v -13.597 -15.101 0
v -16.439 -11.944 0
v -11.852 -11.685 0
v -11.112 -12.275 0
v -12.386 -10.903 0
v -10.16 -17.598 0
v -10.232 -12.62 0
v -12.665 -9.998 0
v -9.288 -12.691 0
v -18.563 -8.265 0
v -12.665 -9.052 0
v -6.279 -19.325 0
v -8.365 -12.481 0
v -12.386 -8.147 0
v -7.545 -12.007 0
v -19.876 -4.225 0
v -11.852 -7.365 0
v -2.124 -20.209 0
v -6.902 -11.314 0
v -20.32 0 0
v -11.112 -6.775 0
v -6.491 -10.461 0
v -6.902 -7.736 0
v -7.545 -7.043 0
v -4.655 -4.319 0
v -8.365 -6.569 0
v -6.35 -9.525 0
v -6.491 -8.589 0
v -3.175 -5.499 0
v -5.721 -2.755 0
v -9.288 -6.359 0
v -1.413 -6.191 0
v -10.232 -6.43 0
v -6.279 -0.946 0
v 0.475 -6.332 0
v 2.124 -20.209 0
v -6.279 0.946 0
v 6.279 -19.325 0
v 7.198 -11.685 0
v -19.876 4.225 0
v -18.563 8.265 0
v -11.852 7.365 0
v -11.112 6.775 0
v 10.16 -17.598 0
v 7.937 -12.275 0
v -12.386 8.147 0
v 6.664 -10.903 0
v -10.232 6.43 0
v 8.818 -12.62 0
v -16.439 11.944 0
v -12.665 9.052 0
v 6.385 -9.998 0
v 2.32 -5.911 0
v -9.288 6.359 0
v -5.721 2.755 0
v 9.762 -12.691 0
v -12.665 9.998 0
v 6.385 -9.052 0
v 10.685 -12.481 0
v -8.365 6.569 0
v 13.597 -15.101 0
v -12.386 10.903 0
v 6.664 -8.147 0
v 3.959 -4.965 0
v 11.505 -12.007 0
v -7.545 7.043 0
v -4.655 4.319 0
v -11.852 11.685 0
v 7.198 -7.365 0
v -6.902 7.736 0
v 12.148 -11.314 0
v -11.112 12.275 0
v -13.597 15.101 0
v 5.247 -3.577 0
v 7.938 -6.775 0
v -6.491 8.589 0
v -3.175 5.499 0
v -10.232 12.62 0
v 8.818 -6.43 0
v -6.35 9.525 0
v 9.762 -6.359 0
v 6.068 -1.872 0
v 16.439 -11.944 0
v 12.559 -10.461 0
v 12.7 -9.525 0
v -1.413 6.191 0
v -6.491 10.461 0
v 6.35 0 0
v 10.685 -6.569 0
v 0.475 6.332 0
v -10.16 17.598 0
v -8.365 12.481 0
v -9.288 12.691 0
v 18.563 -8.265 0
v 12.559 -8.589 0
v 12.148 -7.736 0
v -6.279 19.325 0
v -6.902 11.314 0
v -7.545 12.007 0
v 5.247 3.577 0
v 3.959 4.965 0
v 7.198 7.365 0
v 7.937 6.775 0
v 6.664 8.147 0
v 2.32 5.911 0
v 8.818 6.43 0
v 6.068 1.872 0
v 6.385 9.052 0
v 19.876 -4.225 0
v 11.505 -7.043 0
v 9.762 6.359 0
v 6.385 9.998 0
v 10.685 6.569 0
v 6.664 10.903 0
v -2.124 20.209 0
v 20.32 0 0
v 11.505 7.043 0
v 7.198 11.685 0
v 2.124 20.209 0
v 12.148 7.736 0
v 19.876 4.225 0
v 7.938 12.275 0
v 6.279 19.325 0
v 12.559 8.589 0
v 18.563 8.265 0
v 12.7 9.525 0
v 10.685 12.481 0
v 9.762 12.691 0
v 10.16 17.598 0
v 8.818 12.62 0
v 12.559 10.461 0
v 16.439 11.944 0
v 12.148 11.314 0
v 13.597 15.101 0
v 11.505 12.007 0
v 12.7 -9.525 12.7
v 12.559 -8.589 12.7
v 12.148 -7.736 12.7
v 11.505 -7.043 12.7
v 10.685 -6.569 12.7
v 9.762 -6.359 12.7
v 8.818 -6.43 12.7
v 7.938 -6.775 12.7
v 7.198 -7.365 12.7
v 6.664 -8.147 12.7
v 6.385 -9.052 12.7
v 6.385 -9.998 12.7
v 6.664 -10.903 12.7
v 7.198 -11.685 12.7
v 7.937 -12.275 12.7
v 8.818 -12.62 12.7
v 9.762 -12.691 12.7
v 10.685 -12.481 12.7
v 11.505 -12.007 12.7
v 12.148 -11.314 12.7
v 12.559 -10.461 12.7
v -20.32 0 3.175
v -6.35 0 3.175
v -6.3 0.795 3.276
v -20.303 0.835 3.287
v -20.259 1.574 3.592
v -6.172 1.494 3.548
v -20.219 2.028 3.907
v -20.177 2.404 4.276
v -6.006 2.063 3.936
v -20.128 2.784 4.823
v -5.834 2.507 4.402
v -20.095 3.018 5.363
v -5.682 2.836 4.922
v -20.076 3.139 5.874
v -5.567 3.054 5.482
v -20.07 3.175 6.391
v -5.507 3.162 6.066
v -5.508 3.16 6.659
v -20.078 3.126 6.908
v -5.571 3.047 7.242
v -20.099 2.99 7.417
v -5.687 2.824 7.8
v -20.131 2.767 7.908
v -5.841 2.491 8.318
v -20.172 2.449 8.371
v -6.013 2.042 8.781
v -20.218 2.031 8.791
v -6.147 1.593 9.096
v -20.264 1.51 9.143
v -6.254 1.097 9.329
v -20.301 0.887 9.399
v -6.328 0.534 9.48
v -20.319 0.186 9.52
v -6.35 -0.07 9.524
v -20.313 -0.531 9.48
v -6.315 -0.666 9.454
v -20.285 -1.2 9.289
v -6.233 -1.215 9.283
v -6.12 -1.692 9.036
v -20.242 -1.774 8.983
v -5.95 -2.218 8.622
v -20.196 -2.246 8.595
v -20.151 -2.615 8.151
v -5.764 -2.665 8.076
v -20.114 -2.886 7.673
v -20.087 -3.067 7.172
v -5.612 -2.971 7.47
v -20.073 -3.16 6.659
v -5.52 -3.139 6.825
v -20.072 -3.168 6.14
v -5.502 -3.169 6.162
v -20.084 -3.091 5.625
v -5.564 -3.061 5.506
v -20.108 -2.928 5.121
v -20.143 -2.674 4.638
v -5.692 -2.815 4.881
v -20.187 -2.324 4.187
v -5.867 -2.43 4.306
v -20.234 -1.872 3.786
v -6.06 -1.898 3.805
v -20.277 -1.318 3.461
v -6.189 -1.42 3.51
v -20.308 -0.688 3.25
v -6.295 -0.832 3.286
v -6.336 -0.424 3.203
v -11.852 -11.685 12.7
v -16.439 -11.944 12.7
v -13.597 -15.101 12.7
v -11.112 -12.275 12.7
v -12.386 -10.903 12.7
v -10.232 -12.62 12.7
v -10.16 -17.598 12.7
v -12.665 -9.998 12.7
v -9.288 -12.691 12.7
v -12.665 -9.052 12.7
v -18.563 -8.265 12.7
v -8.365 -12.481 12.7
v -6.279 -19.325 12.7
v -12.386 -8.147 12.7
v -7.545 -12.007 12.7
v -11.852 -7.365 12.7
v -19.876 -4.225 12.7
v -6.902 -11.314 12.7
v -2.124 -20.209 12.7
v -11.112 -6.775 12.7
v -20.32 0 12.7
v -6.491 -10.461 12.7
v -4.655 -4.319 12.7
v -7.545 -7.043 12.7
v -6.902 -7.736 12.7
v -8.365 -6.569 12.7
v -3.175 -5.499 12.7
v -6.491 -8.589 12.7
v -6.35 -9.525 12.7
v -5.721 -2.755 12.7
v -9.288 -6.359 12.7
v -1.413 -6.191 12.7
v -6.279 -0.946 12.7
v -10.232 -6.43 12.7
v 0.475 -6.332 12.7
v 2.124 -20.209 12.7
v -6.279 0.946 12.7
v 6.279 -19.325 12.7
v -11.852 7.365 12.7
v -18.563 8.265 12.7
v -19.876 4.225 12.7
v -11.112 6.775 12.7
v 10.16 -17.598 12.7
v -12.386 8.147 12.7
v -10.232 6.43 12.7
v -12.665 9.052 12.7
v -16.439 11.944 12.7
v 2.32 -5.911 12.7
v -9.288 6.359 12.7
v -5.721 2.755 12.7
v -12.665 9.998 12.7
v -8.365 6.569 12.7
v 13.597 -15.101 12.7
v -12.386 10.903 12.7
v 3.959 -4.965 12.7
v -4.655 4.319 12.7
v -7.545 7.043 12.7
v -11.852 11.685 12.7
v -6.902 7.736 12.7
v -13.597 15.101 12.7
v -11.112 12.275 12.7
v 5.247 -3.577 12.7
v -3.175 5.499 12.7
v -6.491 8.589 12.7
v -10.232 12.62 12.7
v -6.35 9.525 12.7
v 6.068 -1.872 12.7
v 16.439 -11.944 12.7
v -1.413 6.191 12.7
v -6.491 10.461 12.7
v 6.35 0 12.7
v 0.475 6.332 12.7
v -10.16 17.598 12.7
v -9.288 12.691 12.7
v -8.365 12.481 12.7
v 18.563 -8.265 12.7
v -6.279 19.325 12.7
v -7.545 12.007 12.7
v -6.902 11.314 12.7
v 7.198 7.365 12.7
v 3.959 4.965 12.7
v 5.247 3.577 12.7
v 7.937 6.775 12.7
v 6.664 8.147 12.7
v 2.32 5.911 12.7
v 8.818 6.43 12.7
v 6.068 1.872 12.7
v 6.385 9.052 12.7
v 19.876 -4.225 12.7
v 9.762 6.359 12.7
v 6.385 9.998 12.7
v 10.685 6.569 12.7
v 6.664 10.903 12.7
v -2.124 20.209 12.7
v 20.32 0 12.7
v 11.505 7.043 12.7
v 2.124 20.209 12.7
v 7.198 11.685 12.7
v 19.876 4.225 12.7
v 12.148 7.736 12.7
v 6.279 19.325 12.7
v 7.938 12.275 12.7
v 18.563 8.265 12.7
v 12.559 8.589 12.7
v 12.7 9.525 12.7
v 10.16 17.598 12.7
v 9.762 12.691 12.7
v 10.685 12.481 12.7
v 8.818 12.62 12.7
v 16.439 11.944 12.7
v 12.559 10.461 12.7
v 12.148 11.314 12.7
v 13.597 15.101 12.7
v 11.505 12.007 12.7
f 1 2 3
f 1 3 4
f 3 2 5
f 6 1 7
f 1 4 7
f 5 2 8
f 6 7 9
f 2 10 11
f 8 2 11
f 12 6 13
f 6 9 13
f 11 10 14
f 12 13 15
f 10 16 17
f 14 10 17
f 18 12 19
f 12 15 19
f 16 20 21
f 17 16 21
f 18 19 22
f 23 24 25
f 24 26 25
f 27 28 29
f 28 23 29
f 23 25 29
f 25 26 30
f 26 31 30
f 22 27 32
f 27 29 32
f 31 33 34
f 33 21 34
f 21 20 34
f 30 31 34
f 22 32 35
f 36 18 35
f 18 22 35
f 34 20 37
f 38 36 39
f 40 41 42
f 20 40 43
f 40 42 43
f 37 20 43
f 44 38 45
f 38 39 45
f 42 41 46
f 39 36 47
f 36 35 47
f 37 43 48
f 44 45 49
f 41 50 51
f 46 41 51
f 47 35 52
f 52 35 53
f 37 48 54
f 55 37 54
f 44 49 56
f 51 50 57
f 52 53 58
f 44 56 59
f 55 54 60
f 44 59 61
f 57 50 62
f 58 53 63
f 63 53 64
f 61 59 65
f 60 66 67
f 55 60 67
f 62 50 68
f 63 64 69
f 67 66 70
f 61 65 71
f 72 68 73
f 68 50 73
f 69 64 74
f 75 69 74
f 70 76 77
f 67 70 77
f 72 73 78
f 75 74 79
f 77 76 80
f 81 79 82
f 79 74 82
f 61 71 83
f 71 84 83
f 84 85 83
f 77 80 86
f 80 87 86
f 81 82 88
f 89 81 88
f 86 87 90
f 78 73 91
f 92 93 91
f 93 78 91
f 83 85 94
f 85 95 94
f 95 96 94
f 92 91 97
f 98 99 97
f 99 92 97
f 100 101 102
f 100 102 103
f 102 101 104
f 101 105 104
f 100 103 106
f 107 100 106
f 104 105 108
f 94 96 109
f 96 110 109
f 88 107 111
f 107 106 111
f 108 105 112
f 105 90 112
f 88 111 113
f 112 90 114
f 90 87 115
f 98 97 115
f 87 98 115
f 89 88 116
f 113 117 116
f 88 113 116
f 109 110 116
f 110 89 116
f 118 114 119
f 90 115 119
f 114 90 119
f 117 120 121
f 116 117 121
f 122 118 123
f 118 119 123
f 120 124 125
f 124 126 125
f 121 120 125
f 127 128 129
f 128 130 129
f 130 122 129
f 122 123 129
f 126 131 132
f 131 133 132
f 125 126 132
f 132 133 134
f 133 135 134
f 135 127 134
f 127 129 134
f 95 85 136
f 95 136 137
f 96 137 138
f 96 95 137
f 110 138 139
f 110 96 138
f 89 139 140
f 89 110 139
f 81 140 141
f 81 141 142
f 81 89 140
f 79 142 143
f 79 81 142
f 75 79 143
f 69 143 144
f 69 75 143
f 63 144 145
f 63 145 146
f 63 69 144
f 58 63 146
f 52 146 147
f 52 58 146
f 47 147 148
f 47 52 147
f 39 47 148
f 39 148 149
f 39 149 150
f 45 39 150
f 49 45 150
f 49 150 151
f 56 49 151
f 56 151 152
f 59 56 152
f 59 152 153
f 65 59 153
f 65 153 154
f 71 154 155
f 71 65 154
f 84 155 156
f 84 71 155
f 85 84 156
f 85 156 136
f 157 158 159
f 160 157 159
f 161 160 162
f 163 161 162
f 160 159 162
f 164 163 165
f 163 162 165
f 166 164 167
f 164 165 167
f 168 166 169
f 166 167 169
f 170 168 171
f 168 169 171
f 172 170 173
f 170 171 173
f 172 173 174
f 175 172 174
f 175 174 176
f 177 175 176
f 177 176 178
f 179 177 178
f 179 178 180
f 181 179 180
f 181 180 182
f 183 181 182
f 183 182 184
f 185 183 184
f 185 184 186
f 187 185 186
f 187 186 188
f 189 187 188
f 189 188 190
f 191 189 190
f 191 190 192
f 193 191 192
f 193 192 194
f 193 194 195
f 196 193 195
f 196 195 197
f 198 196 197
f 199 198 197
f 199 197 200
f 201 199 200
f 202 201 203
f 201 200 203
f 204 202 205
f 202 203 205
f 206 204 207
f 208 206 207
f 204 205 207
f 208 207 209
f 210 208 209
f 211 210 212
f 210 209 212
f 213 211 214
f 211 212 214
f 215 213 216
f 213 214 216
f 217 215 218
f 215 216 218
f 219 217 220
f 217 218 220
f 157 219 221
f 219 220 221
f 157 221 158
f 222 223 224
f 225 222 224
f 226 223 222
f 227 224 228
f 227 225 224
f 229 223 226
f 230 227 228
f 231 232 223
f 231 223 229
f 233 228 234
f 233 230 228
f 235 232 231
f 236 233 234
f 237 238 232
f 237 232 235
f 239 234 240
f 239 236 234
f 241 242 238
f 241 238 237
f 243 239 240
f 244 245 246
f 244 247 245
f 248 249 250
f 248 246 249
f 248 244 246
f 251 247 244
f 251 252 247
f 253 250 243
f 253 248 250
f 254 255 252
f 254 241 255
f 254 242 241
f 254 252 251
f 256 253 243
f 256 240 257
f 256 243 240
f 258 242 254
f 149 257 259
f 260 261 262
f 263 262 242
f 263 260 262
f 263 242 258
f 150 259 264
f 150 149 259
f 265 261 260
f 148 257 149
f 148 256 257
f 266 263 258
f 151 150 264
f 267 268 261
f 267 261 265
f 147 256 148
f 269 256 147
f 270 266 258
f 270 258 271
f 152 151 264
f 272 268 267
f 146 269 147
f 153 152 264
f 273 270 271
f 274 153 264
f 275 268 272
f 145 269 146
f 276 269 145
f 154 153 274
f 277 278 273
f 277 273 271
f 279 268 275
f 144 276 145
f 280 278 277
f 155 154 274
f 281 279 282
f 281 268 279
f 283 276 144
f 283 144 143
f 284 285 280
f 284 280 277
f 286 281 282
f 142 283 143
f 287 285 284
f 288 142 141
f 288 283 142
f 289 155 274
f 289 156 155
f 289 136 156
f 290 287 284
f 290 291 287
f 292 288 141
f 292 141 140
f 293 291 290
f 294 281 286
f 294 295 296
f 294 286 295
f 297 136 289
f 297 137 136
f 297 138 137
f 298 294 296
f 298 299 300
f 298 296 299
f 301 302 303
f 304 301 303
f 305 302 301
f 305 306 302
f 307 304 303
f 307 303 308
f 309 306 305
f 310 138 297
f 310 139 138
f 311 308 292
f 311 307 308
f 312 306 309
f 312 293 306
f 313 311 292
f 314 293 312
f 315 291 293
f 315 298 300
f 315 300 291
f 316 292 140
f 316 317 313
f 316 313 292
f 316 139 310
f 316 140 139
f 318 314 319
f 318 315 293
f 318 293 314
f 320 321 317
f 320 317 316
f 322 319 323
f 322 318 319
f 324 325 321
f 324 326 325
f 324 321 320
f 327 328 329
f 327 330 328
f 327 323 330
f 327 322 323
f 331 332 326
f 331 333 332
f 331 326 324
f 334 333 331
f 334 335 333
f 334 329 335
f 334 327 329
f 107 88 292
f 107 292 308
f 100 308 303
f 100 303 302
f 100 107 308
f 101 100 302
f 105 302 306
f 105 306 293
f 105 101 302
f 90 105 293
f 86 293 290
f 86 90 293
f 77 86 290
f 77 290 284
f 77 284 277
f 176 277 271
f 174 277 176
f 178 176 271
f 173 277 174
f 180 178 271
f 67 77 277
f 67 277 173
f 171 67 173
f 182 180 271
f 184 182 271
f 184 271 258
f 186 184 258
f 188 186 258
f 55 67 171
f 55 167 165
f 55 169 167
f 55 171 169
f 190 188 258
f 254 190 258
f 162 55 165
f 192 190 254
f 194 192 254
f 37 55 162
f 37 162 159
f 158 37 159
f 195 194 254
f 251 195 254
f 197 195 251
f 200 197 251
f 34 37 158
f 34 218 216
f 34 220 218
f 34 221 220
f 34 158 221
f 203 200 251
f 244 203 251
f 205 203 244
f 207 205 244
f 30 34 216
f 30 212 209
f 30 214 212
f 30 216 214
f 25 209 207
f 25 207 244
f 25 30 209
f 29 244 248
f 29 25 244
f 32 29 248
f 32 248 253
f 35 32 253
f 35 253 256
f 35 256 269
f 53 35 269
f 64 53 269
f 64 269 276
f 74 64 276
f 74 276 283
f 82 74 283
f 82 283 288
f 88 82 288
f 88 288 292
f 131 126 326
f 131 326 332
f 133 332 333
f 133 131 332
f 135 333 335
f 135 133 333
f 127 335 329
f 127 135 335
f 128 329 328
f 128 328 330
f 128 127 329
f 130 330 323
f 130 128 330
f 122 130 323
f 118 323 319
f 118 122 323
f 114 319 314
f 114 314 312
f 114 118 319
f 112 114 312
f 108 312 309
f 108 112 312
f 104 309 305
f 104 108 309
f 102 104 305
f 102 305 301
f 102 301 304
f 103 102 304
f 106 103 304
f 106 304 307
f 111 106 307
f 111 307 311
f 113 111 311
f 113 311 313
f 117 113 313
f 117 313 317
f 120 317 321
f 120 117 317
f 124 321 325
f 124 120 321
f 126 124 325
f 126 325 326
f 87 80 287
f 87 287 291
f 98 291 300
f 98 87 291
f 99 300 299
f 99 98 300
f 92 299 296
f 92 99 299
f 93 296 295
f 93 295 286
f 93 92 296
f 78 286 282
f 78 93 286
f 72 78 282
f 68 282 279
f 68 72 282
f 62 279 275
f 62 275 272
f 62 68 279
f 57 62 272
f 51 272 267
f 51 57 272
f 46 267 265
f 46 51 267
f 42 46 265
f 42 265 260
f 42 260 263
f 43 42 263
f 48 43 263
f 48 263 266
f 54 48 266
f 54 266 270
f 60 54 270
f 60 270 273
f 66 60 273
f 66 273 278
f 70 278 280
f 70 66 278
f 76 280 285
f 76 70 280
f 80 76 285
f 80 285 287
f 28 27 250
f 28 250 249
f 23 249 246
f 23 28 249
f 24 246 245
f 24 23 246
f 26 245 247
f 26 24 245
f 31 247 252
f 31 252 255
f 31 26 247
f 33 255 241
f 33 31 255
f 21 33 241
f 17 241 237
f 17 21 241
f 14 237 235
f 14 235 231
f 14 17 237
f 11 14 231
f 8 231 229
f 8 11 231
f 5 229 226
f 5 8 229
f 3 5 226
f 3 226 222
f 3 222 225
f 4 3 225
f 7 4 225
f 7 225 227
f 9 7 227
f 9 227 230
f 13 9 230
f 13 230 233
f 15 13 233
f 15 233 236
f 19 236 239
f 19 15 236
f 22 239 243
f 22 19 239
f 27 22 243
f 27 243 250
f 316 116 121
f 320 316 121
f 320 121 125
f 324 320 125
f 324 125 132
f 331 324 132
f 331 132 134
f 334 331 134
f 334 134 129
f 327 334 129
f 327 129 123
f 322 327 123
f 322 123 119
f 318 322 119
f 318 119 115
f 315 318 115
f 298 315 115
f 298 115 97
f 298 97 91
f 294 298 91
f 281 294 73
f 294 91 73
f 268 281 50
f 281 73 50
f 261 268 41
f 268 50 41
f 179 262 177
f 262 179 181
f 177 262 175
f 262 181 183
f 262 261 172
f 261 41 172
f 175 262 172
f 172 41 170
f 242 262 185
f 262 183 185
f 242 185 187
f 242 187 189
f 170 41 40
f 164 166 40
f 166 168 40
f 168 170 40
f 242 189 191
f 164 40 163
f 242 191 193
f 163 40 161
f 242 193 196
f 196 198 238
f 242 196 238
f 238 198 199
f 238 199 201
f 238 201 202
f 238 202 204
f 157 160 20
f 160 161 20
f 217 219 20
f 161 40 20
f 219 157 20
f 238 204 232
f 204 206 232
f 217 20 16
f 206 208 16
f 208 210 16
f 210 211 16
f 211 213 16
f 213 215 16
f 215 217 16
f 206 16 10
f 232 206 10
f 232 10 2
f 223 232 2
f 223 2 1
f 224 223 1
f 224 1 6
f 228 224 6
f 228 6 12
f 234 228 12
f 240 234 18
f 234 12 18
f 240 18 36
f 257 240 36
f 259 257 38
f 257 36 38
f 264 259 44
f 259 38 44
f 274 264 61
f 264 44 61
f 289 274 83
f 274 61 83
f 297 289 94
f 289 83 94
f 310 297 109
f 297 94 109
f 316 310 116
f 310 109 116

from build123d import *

# Parameters (mm, degrees)
SKETCH1_R           = 20.32
SKETCH1_R_2         = 3.175
SKETCH1_R_3         = 6.35
BOSS_EXTRUDE1_DEPTH = 12.7
SKETCH2_R           = 3.175
CUT_EXTRUDE1_DEPTH  = 21.32


with BuildPart() as part:
    # Sketch1 → Boss-Extrude1 (new body)
    with BuildSketch(Plane.XY):
        Circle(SKETCH1_R)
        with Locations((-9.525, -9.525)):
            Circle(SKETCH1_R_2, mode=Mode.SUBTRACT)
        with Locations((9.525, -9.525)):
            Circle(SKETCH1_R_2, mode=Mode.SUBTRACT)
        with Locations((9.525, 9.525)):
            Circle(SKETCH1_R_2, mode=Mode.SUBTRACT)
        with Locations((-9.525, 9.525)):
            Circle(SKETCH1_R_2, mode=Mode.SUBTRACT)
        Circle(SKETCH1_R_3, mode=Mode.SUBTRACT)
    extrude(amount=BOSS_EXTRUDE1_DEPTH)

    # Sketch2 → Cut-Extrude1 (cut, through all)
    with BuildSketch(Plane(origin=(0, 0, 0), x_dir=(0, 0, -1), z_dir=(1, 0, 0))):
        with Locations((-6.35, 0)):
            Circle(SKETCH2_R)
    extrude(amount=-CUT_EXTRUDE1_DEPTH, mode=Mode.SUBTRACT)


solid = part.part
